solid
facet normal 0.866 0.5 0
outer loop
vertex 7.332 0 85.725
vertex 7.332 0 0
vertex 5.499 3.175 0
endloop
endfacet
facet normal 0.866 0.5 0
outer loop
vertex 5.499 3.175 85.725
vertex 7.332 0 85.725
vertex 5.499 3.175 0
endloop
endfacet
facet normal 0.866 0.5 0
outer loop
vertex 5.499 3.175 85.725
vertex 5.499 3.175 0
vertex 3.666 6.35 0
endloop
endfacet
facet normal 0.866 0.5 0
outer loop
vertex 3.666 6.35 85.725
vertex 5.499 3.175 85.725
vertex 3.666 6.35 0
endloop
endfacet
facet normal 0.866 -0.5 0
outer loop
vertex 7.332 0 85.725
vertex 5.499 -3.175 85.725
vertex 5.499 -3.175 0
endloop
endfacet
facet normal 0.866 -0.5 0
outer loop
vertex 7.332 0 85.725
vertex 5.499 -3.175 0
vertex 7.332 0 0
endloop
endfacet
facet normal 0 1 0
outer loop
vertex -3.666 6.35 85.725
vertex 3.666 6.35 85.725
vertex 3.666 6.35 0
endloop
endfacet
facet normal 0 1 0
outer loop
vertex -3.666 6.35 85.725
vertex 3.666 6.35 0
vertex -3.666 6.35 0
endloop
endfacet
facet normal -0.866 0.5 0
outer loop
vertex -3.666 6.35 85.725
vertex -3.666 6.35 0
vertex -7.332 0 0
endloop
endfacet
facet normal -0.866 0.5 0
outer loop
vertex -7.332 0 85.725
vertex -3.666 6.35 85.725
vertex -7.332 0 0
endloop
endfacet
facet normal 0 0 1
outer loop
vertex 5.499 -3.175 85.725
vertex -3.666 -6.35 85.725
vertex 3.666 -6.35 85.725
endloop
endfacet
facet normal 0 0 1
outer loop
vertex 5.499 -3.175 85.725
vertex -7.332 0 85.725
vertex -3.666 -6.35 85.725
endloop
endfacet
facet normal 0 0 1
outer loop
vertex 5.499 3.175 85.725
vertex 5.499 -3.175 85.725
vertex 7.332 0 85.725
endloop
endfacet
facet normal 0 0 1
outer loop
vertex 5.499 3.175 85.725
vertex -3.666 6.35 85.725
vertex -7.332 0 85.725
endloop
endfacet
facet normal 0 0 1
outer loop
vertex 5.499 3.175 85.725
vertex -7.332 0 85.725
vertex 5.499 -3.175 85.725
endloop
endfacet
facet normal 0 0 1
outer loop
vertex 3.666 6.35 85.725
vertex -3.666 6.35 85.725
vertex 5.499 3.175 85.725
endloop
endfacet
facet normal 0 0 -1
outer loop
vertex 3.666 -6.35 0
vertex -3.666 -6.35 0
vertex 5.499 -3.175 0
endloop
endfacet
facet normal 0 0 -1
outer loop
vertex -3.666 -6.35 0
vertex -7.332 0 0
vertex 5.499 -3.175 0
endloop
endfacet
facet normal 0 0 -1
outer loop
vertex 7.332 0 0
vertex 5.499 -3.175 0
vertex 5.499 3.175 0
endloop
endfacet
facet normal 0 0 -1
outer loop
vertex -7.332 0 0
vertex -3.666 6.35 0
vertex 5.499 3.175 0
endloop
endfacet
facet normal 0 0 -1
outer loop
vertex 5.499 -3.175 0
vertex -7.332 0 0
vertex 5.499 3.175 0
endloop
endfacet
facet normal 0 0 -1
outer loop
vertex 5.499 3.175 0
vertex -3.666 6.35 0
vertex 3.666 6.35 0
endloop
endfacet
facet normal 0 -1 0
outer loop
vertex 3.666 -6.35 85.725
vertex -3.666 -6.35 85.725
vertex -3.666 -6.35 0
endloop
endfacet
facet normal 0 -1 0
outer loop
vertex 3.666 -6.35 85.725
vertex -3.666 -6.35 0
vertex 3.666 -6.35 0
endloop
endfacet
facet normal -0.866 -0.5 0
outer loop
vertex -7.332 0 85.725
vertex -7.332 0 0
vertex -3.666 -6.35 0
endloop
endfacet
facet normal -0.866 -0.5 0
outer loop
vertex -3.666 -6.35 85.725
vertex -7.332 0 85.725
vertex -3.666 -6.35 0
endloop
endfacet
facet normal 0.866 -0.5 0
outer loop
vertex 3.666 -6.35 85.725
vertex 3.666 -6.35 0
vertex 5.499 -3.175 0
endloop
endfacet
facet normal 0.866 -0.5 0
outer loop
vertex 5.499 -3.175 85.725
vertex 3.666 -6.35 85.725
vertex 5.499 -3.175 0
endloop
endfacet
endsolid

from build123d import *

# Parameters (mm, degrees)
F1_DEPTH = 85.725


with BuildPart() as f1:
    # F0 (on Top) → F1 (new body)
    with BuildSketch(Plane.XY):
        with BuildLine():
            ThreePointArc((5.4992612751, -3.1750000674), (6.1336289869, -1.643500974), (6.35, 0))
            ThreePointArc((6.35, 0), (6.1336289976, 1.6435009339), (5.4992613166, 3.1749999956))
            ThreePointArc((5.4992613166, 3.1749999956), (3.1750000022, 5.4992613128), (0, 6.35))
            ThreePointArc((0, 6.35), (-3.175000032, 5.4992612955), (-5.499261351, 3.174999936))
            ThreePointArc((-5.499261351, 3.174999936), (-6.35, 0), (-5.499261351, -3.174999936))
            ThreePointArc((-5.499261351, -3.174999936), (-3.175000032, -5.4992612955), (0, -6.35))
            ThreePointArc((0, -6.35), (3.1749999663, -5.4992613335), (5.4992612751, -3.1750000674))
        make_face()
        with BuildLine():
            ThreePointArc((5.4992613166, 3.1749999956), (6.1336289976, 1.6435009339), (6.35, 0))
            ThreePointArc((6.35, 0), (6.1336289869, -1.643500974), (5.4992612751, -3.1750000674))
            Line((5.4992612751, -3.1750000674), (7.3323484187, 0))
            Line((7.3323484187, 0), (5.4992613166, 3.1749999956))
        make_face()
        with BuildLine():
            ThreePointArc((0, 6.35), (3.1750000022, 5.4992613128), (5.4992613166, 3.1749999956))
            Line((5.4992613166, 3.1749999956), (3.6661742094, 6.35))
            Line((3.6661742094, 6.35), (0, 6.35))
        make_face()
        with BuildLine():
            Line((3.6661742094, -6.35), (5.4992612751, -3.1750000674))
            ThreePointArc((5.4992612751, -3.1750000674), (3.1749999663, -5.4992613335), (0, -6.35))
            Line((0, -6.35), (3.6661742094, -6.35))
        make_face()
        with BuildLine():
            ThreePointArc((-5.499261351, 3.174999936), (-3.175000032, 5.4992612955), (0, 6.35))
            Line((0, 6.35), (-3.6661742094, 6.35))
            Line((-3.6661742094, 6.35), (-5.499261351, 3.174999936))
        make_face()
        with BuildLine():
            Line((-3.6661742094, -6.35), (0, -6.35))
            ThreePointArc((0, -6.35), (-3.175000032, -5.4992612955), (-5.499261351, -3.174999936))
            Line((-5.499261351, -3.174999936), (-3.6661742094, -6.35))
        make_face()
        with BuildLine():
            ThreePointArc((-5.499261351, -3.174999936), (-6.35, 0), (-5.499261351, 3.174999936))
            Line((-5.499261351, 3.174999936), (-7.3323484187, 0))
            Line((-7.3323484187, 0), (-5.499261351, -3.174999936))
        make_face()
    extrude(amount=F1_DEPTH)


solid = f1.part
